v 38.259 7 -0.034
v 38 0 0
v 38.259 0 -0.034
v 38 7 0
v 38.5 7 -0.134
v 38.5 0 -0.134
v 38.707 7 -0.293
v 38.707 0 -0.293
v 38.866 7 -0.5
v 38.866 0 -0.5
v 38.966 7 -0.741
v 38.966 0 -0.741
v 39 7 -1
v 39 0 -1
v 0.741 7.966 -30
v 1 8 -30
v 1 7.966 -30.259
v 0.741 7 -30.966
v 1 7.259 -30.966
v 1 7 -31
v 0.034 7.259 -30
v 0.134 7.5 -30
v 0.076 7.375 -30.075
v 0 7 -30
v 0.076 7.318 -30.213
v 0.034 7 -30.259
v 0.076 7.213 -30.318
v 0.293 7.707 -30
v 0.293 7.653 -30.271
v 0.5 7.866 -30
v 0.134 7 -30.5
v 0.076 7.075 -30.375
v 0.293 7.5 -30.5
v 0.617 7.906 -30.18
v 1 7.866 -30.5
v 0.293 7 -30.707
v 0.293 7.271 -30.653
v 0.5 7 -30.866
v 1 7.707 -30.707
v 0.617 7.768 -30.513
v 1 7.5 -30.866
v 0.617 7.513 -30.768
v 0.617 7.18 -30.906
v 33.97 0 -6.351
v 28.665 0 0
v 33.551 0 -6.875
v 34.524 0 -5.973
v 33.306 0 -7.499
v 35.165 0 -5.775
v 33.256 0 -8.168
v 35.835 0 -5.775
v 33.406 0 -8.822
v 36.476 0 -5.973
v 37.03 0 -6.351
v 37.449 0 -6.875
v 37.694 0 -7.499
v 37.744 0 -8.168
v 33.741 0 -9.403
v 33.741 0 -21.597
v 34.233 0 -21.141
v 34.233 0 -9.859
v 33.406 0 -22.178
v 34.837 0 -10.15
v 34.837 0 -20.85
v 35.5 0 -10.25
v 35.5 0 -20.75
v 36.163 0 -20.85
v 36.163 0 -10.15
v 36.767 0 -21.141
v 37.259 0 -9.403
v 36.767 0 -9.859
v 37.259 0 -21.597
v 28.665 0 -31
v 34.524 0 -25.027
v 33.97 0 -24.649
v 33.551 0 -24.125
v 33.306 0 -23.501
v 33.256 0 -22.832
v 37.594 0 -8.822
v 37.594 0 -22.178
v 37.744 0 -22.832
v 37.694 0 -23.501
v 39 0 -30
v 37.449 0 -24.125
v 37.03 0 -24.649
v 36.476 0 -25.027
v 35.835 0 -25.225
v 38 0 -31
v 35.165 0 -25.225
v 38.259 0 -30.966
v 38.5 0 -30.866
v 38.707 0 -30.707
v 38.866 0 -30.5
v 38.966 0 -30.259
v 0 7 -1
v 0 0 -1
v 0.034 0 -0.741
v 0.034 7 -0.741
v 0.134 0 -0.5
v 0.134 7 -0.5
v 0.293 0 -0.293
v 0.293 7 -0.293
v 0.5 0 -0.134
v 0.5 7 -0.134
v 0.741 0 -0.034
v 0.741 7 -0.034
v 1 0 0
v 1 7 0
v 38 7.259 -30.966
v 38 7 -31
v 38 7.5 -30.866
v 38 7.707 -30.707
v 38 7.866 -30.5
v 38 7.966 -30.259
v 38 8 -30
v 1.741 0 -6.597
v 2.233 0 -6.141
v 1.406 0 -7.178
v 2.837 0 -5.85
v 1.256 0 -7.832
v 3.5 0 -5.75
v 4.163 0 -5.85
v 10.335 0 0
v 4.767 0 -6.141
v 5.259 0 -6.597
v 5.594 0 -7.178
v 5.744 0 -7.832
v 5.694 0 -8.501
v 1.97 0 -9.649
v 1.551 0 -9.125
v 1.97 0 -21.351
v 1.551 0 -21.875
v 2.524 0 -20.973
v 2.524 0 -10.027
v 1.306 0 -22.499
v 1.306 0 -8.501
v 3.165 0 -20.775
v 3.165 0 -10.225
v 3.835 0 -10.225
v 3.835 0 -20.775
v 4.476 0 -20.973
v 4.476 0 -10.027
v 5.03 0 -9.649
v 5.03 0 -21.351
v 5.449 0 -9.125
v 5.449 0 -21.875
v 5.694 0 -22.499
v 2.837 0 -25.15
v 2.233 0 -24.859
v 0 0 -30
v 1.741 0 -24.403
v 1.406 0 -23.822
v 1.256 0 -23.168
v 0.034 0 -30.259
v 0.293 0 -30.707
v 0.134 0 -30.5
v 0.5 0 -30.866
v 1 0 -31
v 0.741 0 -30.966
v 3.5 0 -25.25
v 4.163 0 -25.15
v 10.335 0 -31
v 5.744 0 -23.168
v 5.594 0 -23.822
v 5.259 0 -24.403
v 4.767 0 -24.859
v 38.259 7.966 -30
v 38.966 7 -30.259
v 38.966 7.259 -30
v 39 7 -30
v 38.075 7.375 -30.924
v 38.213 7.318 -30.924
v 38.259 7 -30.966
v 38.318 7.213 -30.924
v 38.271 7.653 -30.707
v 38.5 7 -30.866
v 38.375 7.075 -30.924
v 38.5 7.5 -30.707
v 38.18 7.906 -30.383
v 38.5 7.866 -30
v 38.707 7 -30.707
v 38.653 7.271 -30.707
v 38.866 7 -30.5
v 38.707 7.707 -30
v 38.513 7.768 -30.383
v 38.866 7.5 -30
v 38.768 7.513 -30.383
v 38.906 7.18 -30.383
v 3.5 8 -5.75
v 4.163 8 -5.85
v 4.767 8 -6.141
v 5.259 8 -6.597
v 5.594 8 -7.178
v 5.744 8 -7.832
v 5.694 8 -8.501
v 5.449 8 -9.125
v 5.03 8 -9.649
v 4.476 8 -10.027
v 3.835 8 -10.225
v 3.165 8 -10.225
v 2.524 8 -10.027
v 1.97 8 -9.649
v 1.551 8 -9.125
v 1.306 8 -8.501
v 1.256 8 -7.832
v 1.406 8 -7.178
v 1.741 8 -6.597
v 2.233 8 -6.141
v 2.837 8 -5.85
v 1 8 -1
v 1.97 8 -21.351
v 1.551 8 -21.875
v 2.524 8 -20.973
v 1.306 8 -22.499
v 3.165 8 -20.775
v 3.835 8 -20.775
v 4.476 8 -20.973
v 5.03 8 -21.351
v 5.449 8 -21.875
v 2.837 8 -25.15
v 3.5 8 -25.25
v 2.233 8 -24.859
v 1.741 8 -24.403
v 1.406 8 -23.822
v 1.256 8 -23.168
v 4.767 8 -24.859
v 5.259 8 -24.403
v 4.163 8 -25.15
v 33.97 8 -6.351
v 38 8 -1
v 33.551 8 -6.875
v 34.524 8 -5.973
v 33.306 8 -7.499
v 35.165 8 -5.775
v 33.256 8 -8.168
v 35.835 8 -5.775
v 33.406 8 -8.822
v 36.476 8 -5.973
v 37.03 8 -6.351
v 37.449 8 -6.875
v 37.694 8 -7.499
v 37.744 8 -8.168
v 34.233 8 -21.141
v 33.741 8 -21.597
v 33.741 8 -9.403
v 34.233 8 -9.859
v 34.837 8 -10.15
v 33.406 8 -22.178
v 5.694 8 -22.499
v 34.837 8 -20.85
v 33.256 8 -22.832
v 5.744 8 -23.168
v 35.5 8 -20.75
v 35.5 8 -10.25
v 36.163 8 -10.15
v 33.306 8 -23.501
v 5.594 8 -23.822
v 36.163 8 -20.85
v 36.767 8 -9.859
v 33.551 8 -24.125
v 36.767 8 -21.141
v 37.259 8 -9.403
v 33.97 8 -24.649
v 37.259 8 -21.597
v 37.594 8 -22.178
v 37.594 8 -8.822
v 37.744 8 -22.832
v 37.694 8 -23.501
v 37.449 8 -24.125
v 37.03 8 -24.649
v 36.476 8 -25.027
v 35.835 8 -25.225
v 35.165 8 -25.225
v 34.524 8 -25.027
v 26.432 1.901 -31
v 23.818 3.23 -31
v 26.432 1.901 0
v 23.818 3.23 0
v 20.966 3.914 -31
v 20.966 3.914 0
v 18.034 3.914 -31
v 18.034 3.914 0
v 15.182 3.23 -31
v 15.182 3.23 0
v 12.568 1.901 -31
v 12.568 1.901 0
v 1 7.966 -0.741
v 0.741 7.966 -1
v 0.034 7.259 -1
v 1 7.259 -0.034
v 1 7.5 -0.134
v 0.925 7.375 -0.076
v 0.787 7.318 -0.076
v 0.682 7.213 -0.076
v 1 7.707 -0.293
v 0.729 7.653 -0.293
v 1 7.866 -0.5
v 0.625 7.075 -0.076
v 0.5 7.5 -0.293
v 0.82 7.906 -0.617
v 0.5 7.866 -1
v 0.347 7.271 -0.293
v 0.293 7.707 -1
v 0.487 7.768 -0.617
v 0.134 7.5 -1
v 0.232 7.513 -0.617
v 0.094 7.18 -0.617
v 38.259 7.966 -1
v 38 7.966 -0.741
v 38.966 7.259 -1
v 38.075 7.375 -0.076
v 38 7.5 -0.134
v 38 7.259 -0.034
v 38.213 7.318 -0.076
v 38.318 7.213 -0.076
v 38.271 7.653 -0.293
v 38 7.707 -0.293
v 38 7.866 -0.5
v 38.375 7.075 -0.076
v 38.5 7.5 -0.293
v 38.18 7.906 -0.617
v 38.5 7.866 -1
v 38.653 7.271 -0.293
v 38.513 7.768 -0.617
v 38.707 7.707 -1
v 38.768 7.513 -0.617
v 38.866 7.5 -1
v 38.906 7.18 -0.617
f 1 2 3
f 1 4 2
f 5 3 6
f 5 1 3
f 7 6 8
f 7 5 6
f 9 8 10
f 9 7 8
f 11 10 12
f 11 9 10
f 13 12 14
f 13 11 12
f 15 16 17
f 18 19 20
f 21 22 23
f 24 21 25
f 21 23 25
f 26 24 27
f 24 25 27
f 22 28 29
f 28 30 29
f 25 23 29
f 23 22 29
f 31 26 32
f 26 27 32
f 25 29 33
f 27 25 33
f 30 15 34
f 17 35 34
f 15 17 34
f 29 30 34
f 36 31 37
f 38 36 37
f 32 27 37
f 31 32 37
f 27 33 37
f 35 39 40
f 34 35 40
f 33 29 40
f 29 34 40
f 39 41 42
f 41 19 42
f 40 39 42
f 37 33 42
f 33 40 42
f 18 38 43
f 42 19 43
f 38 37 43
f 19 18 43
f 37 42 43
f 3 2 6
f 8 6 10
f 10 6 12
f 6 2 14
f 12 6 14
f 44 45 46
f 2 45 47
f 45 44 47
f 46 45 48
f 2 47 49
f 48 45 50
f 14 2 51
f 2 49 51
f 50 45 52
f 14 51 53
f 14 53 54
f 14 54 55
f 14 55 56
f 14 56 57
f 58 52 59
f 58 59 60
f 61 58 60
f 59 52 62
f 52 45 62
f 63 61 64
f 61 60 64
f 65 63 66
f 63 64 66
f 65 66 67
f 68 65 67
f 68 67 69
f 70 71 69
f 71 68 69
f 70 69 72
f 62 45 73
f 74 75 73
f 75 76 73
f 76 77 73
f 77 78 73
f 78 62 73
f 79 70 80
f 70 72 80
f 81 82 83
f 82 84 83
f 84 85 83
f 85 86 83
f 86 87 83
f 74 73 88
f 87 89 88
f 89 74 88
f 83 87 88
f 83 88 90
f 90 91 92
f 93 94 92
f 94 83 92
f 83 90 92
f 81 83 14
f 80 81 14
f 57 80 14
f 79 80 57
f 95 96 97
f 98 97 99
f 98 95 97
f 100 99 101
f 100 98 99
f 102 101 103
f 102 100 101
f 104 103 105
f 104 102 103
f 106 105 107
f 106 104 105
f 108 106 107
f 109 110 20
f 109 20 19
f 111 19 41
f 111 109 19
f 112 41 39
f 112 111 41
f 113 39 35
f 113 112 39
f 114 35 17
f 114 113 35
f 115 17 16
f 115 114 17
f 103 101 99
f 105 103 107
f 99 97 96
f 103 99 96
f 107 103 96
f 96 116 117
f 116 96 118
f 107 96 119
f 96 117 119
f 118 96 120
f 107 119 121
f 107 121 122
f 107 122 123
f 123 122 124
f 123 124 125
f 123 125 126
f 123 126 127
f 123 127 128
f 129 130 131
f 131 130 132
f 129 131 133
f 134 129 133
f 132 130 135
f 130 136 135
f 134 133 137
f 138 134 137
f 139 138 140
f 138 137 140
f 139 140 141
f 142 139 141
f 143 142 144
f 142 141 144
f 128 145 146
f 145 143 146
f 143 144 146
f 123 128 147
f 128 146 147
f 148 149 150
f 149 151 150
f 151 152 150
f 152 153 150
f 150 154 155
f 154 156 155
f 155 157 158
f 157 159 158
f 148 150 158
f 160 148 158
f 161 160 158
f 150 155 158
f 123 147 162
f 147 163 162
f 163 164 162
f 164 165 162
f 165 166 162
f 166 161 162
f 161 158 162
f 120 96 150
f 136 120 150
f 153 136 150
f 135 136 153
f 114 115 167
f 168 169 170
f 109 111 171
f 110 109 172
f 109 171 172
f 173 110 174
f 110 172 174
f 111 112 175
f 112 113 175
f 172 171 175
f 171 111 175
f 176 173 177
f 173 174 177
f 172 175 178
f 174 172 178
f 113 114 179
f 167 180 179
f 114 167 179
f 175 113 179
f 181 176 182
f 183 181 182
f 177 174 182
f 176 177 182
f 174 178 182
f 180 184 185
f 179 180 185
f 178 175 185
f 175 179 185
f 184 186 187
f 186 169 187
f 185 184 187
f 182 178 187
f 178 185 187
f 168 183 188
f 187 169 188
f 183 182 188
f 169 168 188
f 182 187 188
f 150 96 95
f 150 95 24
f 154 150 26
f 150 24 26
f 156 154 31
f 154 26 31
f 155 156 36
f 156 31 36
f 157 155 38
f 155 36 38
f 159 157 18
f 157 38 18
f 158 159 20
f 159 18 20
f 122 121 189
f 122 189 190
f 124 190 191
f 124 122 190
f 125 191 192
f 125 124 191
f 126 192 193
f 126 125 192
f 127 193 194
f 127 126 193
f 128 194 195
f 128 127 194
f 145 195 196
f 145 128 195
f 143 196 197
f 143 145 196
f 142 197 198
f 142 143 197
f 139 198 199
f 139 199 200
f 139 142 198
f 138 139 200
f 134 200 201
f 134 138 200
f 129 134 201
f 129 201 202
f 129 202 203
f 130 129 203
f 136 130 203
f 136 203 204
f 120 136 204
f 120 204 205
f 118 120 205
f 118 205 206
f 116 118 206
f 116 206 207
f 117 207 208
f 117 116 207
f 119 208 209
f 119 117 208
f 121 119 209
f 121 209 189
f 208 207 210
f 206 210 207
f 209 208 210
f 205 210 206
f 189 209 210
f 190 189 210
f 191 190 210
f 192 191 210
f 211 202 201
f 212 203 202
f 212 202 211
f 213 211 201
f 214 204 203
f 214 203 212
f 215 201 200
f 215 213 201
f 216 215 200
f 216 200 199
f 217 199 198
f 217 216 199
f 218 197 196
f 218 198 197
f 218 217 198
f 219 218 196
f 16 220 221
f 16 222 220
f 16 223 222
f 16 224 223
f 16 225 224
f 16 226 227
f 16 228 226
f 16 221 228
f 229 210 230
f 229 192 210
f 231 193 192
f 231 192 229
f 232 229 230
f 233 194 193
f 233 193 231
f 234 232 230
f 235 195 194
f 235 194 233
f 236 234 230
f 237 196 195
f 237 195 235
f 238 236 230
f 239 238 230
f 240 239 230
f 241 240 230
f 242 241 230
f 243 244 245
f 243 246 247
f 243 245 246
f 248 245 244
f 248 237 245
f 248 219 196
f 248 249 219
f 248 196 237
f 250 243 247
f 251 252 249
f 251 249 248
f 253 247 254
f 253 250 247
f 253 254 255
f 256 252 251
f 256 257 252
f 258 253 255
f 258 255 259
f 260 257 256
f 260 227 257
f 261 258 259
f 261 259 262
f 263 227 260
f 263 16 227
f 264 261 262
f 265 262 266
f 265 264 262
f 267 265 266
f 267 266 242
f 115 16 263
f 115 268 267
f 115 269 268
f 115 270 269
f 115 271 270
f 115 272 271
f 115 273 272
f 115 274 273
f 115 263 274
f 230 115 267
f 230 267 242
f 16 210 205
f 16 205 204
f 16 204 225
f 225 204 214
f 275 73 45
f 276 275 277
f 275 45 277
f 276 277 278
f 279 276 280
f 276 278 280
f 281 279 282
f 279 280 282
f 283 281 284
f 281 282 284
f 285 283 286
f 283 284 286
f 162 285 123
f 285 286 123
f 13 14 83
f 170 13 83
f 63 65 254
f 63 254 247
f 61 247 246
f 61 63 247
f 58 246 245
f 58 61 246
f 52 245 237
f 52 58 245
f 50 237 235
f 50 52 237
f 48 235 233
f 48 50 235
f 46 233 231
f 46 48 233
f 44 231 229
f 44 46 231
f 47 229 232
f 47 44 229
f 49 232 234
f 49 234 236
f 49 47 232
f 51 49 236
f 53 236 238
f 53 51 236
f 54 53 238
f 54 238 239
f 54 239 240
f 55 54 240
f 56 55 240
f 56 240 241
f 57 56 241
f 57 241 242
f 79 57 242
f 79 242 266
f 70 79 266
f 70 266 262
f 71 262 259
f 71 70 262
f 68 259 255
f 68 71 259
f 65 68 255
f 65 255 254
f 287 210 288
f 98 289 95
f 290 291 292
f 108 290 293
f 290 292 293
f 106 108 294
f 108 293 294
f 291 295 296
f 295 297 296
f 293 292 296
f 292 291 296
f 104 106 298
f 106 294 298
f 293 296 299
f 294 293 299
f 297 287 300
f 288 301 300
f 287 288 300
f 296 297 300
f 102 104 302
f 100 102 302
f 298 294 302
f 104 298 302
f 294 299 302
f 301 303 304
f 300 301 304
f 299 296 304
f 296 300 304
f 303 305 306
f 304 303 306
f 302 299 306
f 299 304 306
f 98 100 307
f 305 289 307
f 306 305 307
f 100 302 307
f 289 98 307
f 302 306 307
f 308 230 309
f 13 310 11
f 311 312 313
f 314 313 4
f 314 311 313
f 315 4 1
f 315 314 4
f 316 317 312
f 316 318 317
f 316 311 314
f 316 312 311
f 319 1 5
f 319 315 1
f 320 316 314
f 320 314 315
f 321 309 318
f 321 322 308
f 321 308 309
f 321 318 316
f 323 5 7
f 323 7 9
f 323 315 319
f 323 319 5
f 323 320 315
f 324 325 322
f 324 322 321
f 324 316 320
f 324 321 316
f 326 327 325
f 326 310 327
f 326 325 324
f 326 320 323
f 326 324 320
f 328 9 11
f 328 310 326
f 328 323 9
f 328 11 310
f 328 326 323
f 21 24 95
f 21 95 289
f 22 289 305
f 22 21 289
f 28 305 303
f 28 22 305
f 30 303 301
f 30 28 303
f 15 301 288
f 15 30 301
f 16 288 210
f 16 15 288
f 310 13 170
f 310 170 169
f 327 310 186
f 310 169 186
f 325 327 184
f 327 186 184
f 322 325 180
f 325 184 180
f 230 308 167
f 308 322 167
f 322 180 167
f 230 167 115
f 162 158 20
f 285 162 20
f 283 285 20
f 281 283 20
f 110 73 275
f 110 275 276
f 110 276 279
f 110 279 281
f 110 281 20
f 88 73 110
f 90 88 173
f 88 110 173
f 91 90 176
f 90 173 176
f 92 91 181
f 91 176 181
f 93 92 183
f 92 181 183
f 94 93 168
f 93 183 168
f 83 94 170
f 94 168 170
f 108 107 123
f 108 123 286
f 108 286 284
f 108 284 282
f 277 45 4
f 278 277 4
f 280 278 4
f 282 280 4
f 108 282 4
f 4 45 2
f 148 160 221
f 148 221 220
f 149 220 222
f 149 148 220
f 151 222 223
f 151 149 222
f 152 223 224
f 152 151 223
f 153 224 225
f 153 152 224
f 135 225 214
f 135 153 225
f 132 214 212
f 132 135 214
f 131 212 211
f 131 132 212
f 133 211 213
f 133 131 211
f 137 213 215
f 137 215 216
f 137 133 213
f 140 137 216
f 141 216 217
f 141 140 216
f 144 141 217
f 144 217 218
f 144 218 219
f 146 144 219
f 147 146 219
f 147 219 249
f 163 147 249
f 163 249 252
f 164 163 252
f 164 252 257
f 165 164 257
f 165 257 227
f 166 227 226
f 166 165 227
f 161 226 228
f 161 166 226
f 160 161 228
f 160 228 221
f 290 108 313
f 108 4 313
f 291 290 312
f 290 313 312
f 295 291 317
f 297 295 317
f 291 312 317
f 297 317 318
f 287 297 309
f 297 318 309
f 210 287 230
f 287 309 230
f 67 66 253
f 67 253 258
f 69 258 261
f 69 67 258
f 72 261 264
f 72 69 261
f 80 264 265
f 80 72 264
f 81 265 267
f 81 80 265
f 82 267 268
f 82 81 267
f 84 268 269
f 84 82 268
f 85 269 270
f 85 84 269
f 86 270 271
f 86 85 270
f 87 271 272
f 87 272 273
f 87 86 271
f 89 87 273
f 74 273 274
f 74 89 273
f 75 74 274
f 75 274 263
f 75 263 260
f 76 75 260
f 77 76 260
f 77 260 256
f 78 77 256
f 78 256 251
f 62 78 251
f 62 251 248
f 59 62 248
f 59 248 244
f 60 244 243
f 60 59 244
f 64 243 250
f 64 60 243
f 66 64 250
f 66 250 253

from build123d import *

# Parameters (mm, degrees)
SKETCH1_W           = 39
SKETCH1_H           = 31
SKETCH1_R           = 2.25
BOSS_EXTRUDE1_DEPTH = 8
FILLET2_R           = 1
CUT_EXTRUDE1_DEPTH  = 31


with BuildPart() as part:
    # Sketch1 → Boss-Extrude1 (new body)
    with BuildSketch(Plane(origin=(0, 0, 0), x_dir=(1, 0, 0), z_dir=(0, 1, 0))):
        with Locations((19.5, 15.5)):
            Rectangle(SKETCH1_W, SKETCH1_H)
        with Locations(Location((35.5, 23, 0), (0, 0, 270))):
            Circle(SKETCH1_R, mode=Mode.SUBTRACT)
        with Locations(Location((35.5, 8, 0), (0, 0, 90))):
            Circle(SKETCH1_R, mode=Mode.SUBTRACT)
        with Locations(Location((3.5, 23, 0), (0, 0, 90))):
            Circle(SKETCH1_R, mode=Mode.SUBTRACT)
        with Locations(Location((3.5, 8, 0), (0, 0, 270))):
            Circle(SKETCH1_R, mode=Mode.SUBTRACT)
    extrude(amount=BOSS_EXTRUDE1_DEPTH)

    # Fillet2
    fillet2_edges = [part.edges().sort_by_distance(p)[0] for p in [
        (39, 8, -15.5),
        (19.5, 8, -31),
        (0, 8, -15.5),
        (19.5, 8, 0),
        (0, 4, -31),
        (39, 4, -31),
        (39, 4, 0),
        (0, 4, 0),
    ]]
    fillet(fillet2_edges, radius=FILLET2_R)

    # Sketch2 → Cut-Extrude1 (cut)
    with BuildSketch(Plane.XY):
        with BuildLine():
            Line((10.33484861, 0), (-5.5, 0))
            Line((-5.5, 0), (-5.5, -10))
            Line((-5.5, -10), (44.5, -10))
            Line((44.5, -10), (44.5, 0))
            Line((44.5, 0), (28.66515139, 0))
            ThreePointArc((28.66515139, 0), (19.5, 4), (10.33484861, 0))
        make_face()
    extrude(amount=-CUT_EXTRUDE1_DEPTH, mode=Mode.SUBTRACT)


solid = part.part
